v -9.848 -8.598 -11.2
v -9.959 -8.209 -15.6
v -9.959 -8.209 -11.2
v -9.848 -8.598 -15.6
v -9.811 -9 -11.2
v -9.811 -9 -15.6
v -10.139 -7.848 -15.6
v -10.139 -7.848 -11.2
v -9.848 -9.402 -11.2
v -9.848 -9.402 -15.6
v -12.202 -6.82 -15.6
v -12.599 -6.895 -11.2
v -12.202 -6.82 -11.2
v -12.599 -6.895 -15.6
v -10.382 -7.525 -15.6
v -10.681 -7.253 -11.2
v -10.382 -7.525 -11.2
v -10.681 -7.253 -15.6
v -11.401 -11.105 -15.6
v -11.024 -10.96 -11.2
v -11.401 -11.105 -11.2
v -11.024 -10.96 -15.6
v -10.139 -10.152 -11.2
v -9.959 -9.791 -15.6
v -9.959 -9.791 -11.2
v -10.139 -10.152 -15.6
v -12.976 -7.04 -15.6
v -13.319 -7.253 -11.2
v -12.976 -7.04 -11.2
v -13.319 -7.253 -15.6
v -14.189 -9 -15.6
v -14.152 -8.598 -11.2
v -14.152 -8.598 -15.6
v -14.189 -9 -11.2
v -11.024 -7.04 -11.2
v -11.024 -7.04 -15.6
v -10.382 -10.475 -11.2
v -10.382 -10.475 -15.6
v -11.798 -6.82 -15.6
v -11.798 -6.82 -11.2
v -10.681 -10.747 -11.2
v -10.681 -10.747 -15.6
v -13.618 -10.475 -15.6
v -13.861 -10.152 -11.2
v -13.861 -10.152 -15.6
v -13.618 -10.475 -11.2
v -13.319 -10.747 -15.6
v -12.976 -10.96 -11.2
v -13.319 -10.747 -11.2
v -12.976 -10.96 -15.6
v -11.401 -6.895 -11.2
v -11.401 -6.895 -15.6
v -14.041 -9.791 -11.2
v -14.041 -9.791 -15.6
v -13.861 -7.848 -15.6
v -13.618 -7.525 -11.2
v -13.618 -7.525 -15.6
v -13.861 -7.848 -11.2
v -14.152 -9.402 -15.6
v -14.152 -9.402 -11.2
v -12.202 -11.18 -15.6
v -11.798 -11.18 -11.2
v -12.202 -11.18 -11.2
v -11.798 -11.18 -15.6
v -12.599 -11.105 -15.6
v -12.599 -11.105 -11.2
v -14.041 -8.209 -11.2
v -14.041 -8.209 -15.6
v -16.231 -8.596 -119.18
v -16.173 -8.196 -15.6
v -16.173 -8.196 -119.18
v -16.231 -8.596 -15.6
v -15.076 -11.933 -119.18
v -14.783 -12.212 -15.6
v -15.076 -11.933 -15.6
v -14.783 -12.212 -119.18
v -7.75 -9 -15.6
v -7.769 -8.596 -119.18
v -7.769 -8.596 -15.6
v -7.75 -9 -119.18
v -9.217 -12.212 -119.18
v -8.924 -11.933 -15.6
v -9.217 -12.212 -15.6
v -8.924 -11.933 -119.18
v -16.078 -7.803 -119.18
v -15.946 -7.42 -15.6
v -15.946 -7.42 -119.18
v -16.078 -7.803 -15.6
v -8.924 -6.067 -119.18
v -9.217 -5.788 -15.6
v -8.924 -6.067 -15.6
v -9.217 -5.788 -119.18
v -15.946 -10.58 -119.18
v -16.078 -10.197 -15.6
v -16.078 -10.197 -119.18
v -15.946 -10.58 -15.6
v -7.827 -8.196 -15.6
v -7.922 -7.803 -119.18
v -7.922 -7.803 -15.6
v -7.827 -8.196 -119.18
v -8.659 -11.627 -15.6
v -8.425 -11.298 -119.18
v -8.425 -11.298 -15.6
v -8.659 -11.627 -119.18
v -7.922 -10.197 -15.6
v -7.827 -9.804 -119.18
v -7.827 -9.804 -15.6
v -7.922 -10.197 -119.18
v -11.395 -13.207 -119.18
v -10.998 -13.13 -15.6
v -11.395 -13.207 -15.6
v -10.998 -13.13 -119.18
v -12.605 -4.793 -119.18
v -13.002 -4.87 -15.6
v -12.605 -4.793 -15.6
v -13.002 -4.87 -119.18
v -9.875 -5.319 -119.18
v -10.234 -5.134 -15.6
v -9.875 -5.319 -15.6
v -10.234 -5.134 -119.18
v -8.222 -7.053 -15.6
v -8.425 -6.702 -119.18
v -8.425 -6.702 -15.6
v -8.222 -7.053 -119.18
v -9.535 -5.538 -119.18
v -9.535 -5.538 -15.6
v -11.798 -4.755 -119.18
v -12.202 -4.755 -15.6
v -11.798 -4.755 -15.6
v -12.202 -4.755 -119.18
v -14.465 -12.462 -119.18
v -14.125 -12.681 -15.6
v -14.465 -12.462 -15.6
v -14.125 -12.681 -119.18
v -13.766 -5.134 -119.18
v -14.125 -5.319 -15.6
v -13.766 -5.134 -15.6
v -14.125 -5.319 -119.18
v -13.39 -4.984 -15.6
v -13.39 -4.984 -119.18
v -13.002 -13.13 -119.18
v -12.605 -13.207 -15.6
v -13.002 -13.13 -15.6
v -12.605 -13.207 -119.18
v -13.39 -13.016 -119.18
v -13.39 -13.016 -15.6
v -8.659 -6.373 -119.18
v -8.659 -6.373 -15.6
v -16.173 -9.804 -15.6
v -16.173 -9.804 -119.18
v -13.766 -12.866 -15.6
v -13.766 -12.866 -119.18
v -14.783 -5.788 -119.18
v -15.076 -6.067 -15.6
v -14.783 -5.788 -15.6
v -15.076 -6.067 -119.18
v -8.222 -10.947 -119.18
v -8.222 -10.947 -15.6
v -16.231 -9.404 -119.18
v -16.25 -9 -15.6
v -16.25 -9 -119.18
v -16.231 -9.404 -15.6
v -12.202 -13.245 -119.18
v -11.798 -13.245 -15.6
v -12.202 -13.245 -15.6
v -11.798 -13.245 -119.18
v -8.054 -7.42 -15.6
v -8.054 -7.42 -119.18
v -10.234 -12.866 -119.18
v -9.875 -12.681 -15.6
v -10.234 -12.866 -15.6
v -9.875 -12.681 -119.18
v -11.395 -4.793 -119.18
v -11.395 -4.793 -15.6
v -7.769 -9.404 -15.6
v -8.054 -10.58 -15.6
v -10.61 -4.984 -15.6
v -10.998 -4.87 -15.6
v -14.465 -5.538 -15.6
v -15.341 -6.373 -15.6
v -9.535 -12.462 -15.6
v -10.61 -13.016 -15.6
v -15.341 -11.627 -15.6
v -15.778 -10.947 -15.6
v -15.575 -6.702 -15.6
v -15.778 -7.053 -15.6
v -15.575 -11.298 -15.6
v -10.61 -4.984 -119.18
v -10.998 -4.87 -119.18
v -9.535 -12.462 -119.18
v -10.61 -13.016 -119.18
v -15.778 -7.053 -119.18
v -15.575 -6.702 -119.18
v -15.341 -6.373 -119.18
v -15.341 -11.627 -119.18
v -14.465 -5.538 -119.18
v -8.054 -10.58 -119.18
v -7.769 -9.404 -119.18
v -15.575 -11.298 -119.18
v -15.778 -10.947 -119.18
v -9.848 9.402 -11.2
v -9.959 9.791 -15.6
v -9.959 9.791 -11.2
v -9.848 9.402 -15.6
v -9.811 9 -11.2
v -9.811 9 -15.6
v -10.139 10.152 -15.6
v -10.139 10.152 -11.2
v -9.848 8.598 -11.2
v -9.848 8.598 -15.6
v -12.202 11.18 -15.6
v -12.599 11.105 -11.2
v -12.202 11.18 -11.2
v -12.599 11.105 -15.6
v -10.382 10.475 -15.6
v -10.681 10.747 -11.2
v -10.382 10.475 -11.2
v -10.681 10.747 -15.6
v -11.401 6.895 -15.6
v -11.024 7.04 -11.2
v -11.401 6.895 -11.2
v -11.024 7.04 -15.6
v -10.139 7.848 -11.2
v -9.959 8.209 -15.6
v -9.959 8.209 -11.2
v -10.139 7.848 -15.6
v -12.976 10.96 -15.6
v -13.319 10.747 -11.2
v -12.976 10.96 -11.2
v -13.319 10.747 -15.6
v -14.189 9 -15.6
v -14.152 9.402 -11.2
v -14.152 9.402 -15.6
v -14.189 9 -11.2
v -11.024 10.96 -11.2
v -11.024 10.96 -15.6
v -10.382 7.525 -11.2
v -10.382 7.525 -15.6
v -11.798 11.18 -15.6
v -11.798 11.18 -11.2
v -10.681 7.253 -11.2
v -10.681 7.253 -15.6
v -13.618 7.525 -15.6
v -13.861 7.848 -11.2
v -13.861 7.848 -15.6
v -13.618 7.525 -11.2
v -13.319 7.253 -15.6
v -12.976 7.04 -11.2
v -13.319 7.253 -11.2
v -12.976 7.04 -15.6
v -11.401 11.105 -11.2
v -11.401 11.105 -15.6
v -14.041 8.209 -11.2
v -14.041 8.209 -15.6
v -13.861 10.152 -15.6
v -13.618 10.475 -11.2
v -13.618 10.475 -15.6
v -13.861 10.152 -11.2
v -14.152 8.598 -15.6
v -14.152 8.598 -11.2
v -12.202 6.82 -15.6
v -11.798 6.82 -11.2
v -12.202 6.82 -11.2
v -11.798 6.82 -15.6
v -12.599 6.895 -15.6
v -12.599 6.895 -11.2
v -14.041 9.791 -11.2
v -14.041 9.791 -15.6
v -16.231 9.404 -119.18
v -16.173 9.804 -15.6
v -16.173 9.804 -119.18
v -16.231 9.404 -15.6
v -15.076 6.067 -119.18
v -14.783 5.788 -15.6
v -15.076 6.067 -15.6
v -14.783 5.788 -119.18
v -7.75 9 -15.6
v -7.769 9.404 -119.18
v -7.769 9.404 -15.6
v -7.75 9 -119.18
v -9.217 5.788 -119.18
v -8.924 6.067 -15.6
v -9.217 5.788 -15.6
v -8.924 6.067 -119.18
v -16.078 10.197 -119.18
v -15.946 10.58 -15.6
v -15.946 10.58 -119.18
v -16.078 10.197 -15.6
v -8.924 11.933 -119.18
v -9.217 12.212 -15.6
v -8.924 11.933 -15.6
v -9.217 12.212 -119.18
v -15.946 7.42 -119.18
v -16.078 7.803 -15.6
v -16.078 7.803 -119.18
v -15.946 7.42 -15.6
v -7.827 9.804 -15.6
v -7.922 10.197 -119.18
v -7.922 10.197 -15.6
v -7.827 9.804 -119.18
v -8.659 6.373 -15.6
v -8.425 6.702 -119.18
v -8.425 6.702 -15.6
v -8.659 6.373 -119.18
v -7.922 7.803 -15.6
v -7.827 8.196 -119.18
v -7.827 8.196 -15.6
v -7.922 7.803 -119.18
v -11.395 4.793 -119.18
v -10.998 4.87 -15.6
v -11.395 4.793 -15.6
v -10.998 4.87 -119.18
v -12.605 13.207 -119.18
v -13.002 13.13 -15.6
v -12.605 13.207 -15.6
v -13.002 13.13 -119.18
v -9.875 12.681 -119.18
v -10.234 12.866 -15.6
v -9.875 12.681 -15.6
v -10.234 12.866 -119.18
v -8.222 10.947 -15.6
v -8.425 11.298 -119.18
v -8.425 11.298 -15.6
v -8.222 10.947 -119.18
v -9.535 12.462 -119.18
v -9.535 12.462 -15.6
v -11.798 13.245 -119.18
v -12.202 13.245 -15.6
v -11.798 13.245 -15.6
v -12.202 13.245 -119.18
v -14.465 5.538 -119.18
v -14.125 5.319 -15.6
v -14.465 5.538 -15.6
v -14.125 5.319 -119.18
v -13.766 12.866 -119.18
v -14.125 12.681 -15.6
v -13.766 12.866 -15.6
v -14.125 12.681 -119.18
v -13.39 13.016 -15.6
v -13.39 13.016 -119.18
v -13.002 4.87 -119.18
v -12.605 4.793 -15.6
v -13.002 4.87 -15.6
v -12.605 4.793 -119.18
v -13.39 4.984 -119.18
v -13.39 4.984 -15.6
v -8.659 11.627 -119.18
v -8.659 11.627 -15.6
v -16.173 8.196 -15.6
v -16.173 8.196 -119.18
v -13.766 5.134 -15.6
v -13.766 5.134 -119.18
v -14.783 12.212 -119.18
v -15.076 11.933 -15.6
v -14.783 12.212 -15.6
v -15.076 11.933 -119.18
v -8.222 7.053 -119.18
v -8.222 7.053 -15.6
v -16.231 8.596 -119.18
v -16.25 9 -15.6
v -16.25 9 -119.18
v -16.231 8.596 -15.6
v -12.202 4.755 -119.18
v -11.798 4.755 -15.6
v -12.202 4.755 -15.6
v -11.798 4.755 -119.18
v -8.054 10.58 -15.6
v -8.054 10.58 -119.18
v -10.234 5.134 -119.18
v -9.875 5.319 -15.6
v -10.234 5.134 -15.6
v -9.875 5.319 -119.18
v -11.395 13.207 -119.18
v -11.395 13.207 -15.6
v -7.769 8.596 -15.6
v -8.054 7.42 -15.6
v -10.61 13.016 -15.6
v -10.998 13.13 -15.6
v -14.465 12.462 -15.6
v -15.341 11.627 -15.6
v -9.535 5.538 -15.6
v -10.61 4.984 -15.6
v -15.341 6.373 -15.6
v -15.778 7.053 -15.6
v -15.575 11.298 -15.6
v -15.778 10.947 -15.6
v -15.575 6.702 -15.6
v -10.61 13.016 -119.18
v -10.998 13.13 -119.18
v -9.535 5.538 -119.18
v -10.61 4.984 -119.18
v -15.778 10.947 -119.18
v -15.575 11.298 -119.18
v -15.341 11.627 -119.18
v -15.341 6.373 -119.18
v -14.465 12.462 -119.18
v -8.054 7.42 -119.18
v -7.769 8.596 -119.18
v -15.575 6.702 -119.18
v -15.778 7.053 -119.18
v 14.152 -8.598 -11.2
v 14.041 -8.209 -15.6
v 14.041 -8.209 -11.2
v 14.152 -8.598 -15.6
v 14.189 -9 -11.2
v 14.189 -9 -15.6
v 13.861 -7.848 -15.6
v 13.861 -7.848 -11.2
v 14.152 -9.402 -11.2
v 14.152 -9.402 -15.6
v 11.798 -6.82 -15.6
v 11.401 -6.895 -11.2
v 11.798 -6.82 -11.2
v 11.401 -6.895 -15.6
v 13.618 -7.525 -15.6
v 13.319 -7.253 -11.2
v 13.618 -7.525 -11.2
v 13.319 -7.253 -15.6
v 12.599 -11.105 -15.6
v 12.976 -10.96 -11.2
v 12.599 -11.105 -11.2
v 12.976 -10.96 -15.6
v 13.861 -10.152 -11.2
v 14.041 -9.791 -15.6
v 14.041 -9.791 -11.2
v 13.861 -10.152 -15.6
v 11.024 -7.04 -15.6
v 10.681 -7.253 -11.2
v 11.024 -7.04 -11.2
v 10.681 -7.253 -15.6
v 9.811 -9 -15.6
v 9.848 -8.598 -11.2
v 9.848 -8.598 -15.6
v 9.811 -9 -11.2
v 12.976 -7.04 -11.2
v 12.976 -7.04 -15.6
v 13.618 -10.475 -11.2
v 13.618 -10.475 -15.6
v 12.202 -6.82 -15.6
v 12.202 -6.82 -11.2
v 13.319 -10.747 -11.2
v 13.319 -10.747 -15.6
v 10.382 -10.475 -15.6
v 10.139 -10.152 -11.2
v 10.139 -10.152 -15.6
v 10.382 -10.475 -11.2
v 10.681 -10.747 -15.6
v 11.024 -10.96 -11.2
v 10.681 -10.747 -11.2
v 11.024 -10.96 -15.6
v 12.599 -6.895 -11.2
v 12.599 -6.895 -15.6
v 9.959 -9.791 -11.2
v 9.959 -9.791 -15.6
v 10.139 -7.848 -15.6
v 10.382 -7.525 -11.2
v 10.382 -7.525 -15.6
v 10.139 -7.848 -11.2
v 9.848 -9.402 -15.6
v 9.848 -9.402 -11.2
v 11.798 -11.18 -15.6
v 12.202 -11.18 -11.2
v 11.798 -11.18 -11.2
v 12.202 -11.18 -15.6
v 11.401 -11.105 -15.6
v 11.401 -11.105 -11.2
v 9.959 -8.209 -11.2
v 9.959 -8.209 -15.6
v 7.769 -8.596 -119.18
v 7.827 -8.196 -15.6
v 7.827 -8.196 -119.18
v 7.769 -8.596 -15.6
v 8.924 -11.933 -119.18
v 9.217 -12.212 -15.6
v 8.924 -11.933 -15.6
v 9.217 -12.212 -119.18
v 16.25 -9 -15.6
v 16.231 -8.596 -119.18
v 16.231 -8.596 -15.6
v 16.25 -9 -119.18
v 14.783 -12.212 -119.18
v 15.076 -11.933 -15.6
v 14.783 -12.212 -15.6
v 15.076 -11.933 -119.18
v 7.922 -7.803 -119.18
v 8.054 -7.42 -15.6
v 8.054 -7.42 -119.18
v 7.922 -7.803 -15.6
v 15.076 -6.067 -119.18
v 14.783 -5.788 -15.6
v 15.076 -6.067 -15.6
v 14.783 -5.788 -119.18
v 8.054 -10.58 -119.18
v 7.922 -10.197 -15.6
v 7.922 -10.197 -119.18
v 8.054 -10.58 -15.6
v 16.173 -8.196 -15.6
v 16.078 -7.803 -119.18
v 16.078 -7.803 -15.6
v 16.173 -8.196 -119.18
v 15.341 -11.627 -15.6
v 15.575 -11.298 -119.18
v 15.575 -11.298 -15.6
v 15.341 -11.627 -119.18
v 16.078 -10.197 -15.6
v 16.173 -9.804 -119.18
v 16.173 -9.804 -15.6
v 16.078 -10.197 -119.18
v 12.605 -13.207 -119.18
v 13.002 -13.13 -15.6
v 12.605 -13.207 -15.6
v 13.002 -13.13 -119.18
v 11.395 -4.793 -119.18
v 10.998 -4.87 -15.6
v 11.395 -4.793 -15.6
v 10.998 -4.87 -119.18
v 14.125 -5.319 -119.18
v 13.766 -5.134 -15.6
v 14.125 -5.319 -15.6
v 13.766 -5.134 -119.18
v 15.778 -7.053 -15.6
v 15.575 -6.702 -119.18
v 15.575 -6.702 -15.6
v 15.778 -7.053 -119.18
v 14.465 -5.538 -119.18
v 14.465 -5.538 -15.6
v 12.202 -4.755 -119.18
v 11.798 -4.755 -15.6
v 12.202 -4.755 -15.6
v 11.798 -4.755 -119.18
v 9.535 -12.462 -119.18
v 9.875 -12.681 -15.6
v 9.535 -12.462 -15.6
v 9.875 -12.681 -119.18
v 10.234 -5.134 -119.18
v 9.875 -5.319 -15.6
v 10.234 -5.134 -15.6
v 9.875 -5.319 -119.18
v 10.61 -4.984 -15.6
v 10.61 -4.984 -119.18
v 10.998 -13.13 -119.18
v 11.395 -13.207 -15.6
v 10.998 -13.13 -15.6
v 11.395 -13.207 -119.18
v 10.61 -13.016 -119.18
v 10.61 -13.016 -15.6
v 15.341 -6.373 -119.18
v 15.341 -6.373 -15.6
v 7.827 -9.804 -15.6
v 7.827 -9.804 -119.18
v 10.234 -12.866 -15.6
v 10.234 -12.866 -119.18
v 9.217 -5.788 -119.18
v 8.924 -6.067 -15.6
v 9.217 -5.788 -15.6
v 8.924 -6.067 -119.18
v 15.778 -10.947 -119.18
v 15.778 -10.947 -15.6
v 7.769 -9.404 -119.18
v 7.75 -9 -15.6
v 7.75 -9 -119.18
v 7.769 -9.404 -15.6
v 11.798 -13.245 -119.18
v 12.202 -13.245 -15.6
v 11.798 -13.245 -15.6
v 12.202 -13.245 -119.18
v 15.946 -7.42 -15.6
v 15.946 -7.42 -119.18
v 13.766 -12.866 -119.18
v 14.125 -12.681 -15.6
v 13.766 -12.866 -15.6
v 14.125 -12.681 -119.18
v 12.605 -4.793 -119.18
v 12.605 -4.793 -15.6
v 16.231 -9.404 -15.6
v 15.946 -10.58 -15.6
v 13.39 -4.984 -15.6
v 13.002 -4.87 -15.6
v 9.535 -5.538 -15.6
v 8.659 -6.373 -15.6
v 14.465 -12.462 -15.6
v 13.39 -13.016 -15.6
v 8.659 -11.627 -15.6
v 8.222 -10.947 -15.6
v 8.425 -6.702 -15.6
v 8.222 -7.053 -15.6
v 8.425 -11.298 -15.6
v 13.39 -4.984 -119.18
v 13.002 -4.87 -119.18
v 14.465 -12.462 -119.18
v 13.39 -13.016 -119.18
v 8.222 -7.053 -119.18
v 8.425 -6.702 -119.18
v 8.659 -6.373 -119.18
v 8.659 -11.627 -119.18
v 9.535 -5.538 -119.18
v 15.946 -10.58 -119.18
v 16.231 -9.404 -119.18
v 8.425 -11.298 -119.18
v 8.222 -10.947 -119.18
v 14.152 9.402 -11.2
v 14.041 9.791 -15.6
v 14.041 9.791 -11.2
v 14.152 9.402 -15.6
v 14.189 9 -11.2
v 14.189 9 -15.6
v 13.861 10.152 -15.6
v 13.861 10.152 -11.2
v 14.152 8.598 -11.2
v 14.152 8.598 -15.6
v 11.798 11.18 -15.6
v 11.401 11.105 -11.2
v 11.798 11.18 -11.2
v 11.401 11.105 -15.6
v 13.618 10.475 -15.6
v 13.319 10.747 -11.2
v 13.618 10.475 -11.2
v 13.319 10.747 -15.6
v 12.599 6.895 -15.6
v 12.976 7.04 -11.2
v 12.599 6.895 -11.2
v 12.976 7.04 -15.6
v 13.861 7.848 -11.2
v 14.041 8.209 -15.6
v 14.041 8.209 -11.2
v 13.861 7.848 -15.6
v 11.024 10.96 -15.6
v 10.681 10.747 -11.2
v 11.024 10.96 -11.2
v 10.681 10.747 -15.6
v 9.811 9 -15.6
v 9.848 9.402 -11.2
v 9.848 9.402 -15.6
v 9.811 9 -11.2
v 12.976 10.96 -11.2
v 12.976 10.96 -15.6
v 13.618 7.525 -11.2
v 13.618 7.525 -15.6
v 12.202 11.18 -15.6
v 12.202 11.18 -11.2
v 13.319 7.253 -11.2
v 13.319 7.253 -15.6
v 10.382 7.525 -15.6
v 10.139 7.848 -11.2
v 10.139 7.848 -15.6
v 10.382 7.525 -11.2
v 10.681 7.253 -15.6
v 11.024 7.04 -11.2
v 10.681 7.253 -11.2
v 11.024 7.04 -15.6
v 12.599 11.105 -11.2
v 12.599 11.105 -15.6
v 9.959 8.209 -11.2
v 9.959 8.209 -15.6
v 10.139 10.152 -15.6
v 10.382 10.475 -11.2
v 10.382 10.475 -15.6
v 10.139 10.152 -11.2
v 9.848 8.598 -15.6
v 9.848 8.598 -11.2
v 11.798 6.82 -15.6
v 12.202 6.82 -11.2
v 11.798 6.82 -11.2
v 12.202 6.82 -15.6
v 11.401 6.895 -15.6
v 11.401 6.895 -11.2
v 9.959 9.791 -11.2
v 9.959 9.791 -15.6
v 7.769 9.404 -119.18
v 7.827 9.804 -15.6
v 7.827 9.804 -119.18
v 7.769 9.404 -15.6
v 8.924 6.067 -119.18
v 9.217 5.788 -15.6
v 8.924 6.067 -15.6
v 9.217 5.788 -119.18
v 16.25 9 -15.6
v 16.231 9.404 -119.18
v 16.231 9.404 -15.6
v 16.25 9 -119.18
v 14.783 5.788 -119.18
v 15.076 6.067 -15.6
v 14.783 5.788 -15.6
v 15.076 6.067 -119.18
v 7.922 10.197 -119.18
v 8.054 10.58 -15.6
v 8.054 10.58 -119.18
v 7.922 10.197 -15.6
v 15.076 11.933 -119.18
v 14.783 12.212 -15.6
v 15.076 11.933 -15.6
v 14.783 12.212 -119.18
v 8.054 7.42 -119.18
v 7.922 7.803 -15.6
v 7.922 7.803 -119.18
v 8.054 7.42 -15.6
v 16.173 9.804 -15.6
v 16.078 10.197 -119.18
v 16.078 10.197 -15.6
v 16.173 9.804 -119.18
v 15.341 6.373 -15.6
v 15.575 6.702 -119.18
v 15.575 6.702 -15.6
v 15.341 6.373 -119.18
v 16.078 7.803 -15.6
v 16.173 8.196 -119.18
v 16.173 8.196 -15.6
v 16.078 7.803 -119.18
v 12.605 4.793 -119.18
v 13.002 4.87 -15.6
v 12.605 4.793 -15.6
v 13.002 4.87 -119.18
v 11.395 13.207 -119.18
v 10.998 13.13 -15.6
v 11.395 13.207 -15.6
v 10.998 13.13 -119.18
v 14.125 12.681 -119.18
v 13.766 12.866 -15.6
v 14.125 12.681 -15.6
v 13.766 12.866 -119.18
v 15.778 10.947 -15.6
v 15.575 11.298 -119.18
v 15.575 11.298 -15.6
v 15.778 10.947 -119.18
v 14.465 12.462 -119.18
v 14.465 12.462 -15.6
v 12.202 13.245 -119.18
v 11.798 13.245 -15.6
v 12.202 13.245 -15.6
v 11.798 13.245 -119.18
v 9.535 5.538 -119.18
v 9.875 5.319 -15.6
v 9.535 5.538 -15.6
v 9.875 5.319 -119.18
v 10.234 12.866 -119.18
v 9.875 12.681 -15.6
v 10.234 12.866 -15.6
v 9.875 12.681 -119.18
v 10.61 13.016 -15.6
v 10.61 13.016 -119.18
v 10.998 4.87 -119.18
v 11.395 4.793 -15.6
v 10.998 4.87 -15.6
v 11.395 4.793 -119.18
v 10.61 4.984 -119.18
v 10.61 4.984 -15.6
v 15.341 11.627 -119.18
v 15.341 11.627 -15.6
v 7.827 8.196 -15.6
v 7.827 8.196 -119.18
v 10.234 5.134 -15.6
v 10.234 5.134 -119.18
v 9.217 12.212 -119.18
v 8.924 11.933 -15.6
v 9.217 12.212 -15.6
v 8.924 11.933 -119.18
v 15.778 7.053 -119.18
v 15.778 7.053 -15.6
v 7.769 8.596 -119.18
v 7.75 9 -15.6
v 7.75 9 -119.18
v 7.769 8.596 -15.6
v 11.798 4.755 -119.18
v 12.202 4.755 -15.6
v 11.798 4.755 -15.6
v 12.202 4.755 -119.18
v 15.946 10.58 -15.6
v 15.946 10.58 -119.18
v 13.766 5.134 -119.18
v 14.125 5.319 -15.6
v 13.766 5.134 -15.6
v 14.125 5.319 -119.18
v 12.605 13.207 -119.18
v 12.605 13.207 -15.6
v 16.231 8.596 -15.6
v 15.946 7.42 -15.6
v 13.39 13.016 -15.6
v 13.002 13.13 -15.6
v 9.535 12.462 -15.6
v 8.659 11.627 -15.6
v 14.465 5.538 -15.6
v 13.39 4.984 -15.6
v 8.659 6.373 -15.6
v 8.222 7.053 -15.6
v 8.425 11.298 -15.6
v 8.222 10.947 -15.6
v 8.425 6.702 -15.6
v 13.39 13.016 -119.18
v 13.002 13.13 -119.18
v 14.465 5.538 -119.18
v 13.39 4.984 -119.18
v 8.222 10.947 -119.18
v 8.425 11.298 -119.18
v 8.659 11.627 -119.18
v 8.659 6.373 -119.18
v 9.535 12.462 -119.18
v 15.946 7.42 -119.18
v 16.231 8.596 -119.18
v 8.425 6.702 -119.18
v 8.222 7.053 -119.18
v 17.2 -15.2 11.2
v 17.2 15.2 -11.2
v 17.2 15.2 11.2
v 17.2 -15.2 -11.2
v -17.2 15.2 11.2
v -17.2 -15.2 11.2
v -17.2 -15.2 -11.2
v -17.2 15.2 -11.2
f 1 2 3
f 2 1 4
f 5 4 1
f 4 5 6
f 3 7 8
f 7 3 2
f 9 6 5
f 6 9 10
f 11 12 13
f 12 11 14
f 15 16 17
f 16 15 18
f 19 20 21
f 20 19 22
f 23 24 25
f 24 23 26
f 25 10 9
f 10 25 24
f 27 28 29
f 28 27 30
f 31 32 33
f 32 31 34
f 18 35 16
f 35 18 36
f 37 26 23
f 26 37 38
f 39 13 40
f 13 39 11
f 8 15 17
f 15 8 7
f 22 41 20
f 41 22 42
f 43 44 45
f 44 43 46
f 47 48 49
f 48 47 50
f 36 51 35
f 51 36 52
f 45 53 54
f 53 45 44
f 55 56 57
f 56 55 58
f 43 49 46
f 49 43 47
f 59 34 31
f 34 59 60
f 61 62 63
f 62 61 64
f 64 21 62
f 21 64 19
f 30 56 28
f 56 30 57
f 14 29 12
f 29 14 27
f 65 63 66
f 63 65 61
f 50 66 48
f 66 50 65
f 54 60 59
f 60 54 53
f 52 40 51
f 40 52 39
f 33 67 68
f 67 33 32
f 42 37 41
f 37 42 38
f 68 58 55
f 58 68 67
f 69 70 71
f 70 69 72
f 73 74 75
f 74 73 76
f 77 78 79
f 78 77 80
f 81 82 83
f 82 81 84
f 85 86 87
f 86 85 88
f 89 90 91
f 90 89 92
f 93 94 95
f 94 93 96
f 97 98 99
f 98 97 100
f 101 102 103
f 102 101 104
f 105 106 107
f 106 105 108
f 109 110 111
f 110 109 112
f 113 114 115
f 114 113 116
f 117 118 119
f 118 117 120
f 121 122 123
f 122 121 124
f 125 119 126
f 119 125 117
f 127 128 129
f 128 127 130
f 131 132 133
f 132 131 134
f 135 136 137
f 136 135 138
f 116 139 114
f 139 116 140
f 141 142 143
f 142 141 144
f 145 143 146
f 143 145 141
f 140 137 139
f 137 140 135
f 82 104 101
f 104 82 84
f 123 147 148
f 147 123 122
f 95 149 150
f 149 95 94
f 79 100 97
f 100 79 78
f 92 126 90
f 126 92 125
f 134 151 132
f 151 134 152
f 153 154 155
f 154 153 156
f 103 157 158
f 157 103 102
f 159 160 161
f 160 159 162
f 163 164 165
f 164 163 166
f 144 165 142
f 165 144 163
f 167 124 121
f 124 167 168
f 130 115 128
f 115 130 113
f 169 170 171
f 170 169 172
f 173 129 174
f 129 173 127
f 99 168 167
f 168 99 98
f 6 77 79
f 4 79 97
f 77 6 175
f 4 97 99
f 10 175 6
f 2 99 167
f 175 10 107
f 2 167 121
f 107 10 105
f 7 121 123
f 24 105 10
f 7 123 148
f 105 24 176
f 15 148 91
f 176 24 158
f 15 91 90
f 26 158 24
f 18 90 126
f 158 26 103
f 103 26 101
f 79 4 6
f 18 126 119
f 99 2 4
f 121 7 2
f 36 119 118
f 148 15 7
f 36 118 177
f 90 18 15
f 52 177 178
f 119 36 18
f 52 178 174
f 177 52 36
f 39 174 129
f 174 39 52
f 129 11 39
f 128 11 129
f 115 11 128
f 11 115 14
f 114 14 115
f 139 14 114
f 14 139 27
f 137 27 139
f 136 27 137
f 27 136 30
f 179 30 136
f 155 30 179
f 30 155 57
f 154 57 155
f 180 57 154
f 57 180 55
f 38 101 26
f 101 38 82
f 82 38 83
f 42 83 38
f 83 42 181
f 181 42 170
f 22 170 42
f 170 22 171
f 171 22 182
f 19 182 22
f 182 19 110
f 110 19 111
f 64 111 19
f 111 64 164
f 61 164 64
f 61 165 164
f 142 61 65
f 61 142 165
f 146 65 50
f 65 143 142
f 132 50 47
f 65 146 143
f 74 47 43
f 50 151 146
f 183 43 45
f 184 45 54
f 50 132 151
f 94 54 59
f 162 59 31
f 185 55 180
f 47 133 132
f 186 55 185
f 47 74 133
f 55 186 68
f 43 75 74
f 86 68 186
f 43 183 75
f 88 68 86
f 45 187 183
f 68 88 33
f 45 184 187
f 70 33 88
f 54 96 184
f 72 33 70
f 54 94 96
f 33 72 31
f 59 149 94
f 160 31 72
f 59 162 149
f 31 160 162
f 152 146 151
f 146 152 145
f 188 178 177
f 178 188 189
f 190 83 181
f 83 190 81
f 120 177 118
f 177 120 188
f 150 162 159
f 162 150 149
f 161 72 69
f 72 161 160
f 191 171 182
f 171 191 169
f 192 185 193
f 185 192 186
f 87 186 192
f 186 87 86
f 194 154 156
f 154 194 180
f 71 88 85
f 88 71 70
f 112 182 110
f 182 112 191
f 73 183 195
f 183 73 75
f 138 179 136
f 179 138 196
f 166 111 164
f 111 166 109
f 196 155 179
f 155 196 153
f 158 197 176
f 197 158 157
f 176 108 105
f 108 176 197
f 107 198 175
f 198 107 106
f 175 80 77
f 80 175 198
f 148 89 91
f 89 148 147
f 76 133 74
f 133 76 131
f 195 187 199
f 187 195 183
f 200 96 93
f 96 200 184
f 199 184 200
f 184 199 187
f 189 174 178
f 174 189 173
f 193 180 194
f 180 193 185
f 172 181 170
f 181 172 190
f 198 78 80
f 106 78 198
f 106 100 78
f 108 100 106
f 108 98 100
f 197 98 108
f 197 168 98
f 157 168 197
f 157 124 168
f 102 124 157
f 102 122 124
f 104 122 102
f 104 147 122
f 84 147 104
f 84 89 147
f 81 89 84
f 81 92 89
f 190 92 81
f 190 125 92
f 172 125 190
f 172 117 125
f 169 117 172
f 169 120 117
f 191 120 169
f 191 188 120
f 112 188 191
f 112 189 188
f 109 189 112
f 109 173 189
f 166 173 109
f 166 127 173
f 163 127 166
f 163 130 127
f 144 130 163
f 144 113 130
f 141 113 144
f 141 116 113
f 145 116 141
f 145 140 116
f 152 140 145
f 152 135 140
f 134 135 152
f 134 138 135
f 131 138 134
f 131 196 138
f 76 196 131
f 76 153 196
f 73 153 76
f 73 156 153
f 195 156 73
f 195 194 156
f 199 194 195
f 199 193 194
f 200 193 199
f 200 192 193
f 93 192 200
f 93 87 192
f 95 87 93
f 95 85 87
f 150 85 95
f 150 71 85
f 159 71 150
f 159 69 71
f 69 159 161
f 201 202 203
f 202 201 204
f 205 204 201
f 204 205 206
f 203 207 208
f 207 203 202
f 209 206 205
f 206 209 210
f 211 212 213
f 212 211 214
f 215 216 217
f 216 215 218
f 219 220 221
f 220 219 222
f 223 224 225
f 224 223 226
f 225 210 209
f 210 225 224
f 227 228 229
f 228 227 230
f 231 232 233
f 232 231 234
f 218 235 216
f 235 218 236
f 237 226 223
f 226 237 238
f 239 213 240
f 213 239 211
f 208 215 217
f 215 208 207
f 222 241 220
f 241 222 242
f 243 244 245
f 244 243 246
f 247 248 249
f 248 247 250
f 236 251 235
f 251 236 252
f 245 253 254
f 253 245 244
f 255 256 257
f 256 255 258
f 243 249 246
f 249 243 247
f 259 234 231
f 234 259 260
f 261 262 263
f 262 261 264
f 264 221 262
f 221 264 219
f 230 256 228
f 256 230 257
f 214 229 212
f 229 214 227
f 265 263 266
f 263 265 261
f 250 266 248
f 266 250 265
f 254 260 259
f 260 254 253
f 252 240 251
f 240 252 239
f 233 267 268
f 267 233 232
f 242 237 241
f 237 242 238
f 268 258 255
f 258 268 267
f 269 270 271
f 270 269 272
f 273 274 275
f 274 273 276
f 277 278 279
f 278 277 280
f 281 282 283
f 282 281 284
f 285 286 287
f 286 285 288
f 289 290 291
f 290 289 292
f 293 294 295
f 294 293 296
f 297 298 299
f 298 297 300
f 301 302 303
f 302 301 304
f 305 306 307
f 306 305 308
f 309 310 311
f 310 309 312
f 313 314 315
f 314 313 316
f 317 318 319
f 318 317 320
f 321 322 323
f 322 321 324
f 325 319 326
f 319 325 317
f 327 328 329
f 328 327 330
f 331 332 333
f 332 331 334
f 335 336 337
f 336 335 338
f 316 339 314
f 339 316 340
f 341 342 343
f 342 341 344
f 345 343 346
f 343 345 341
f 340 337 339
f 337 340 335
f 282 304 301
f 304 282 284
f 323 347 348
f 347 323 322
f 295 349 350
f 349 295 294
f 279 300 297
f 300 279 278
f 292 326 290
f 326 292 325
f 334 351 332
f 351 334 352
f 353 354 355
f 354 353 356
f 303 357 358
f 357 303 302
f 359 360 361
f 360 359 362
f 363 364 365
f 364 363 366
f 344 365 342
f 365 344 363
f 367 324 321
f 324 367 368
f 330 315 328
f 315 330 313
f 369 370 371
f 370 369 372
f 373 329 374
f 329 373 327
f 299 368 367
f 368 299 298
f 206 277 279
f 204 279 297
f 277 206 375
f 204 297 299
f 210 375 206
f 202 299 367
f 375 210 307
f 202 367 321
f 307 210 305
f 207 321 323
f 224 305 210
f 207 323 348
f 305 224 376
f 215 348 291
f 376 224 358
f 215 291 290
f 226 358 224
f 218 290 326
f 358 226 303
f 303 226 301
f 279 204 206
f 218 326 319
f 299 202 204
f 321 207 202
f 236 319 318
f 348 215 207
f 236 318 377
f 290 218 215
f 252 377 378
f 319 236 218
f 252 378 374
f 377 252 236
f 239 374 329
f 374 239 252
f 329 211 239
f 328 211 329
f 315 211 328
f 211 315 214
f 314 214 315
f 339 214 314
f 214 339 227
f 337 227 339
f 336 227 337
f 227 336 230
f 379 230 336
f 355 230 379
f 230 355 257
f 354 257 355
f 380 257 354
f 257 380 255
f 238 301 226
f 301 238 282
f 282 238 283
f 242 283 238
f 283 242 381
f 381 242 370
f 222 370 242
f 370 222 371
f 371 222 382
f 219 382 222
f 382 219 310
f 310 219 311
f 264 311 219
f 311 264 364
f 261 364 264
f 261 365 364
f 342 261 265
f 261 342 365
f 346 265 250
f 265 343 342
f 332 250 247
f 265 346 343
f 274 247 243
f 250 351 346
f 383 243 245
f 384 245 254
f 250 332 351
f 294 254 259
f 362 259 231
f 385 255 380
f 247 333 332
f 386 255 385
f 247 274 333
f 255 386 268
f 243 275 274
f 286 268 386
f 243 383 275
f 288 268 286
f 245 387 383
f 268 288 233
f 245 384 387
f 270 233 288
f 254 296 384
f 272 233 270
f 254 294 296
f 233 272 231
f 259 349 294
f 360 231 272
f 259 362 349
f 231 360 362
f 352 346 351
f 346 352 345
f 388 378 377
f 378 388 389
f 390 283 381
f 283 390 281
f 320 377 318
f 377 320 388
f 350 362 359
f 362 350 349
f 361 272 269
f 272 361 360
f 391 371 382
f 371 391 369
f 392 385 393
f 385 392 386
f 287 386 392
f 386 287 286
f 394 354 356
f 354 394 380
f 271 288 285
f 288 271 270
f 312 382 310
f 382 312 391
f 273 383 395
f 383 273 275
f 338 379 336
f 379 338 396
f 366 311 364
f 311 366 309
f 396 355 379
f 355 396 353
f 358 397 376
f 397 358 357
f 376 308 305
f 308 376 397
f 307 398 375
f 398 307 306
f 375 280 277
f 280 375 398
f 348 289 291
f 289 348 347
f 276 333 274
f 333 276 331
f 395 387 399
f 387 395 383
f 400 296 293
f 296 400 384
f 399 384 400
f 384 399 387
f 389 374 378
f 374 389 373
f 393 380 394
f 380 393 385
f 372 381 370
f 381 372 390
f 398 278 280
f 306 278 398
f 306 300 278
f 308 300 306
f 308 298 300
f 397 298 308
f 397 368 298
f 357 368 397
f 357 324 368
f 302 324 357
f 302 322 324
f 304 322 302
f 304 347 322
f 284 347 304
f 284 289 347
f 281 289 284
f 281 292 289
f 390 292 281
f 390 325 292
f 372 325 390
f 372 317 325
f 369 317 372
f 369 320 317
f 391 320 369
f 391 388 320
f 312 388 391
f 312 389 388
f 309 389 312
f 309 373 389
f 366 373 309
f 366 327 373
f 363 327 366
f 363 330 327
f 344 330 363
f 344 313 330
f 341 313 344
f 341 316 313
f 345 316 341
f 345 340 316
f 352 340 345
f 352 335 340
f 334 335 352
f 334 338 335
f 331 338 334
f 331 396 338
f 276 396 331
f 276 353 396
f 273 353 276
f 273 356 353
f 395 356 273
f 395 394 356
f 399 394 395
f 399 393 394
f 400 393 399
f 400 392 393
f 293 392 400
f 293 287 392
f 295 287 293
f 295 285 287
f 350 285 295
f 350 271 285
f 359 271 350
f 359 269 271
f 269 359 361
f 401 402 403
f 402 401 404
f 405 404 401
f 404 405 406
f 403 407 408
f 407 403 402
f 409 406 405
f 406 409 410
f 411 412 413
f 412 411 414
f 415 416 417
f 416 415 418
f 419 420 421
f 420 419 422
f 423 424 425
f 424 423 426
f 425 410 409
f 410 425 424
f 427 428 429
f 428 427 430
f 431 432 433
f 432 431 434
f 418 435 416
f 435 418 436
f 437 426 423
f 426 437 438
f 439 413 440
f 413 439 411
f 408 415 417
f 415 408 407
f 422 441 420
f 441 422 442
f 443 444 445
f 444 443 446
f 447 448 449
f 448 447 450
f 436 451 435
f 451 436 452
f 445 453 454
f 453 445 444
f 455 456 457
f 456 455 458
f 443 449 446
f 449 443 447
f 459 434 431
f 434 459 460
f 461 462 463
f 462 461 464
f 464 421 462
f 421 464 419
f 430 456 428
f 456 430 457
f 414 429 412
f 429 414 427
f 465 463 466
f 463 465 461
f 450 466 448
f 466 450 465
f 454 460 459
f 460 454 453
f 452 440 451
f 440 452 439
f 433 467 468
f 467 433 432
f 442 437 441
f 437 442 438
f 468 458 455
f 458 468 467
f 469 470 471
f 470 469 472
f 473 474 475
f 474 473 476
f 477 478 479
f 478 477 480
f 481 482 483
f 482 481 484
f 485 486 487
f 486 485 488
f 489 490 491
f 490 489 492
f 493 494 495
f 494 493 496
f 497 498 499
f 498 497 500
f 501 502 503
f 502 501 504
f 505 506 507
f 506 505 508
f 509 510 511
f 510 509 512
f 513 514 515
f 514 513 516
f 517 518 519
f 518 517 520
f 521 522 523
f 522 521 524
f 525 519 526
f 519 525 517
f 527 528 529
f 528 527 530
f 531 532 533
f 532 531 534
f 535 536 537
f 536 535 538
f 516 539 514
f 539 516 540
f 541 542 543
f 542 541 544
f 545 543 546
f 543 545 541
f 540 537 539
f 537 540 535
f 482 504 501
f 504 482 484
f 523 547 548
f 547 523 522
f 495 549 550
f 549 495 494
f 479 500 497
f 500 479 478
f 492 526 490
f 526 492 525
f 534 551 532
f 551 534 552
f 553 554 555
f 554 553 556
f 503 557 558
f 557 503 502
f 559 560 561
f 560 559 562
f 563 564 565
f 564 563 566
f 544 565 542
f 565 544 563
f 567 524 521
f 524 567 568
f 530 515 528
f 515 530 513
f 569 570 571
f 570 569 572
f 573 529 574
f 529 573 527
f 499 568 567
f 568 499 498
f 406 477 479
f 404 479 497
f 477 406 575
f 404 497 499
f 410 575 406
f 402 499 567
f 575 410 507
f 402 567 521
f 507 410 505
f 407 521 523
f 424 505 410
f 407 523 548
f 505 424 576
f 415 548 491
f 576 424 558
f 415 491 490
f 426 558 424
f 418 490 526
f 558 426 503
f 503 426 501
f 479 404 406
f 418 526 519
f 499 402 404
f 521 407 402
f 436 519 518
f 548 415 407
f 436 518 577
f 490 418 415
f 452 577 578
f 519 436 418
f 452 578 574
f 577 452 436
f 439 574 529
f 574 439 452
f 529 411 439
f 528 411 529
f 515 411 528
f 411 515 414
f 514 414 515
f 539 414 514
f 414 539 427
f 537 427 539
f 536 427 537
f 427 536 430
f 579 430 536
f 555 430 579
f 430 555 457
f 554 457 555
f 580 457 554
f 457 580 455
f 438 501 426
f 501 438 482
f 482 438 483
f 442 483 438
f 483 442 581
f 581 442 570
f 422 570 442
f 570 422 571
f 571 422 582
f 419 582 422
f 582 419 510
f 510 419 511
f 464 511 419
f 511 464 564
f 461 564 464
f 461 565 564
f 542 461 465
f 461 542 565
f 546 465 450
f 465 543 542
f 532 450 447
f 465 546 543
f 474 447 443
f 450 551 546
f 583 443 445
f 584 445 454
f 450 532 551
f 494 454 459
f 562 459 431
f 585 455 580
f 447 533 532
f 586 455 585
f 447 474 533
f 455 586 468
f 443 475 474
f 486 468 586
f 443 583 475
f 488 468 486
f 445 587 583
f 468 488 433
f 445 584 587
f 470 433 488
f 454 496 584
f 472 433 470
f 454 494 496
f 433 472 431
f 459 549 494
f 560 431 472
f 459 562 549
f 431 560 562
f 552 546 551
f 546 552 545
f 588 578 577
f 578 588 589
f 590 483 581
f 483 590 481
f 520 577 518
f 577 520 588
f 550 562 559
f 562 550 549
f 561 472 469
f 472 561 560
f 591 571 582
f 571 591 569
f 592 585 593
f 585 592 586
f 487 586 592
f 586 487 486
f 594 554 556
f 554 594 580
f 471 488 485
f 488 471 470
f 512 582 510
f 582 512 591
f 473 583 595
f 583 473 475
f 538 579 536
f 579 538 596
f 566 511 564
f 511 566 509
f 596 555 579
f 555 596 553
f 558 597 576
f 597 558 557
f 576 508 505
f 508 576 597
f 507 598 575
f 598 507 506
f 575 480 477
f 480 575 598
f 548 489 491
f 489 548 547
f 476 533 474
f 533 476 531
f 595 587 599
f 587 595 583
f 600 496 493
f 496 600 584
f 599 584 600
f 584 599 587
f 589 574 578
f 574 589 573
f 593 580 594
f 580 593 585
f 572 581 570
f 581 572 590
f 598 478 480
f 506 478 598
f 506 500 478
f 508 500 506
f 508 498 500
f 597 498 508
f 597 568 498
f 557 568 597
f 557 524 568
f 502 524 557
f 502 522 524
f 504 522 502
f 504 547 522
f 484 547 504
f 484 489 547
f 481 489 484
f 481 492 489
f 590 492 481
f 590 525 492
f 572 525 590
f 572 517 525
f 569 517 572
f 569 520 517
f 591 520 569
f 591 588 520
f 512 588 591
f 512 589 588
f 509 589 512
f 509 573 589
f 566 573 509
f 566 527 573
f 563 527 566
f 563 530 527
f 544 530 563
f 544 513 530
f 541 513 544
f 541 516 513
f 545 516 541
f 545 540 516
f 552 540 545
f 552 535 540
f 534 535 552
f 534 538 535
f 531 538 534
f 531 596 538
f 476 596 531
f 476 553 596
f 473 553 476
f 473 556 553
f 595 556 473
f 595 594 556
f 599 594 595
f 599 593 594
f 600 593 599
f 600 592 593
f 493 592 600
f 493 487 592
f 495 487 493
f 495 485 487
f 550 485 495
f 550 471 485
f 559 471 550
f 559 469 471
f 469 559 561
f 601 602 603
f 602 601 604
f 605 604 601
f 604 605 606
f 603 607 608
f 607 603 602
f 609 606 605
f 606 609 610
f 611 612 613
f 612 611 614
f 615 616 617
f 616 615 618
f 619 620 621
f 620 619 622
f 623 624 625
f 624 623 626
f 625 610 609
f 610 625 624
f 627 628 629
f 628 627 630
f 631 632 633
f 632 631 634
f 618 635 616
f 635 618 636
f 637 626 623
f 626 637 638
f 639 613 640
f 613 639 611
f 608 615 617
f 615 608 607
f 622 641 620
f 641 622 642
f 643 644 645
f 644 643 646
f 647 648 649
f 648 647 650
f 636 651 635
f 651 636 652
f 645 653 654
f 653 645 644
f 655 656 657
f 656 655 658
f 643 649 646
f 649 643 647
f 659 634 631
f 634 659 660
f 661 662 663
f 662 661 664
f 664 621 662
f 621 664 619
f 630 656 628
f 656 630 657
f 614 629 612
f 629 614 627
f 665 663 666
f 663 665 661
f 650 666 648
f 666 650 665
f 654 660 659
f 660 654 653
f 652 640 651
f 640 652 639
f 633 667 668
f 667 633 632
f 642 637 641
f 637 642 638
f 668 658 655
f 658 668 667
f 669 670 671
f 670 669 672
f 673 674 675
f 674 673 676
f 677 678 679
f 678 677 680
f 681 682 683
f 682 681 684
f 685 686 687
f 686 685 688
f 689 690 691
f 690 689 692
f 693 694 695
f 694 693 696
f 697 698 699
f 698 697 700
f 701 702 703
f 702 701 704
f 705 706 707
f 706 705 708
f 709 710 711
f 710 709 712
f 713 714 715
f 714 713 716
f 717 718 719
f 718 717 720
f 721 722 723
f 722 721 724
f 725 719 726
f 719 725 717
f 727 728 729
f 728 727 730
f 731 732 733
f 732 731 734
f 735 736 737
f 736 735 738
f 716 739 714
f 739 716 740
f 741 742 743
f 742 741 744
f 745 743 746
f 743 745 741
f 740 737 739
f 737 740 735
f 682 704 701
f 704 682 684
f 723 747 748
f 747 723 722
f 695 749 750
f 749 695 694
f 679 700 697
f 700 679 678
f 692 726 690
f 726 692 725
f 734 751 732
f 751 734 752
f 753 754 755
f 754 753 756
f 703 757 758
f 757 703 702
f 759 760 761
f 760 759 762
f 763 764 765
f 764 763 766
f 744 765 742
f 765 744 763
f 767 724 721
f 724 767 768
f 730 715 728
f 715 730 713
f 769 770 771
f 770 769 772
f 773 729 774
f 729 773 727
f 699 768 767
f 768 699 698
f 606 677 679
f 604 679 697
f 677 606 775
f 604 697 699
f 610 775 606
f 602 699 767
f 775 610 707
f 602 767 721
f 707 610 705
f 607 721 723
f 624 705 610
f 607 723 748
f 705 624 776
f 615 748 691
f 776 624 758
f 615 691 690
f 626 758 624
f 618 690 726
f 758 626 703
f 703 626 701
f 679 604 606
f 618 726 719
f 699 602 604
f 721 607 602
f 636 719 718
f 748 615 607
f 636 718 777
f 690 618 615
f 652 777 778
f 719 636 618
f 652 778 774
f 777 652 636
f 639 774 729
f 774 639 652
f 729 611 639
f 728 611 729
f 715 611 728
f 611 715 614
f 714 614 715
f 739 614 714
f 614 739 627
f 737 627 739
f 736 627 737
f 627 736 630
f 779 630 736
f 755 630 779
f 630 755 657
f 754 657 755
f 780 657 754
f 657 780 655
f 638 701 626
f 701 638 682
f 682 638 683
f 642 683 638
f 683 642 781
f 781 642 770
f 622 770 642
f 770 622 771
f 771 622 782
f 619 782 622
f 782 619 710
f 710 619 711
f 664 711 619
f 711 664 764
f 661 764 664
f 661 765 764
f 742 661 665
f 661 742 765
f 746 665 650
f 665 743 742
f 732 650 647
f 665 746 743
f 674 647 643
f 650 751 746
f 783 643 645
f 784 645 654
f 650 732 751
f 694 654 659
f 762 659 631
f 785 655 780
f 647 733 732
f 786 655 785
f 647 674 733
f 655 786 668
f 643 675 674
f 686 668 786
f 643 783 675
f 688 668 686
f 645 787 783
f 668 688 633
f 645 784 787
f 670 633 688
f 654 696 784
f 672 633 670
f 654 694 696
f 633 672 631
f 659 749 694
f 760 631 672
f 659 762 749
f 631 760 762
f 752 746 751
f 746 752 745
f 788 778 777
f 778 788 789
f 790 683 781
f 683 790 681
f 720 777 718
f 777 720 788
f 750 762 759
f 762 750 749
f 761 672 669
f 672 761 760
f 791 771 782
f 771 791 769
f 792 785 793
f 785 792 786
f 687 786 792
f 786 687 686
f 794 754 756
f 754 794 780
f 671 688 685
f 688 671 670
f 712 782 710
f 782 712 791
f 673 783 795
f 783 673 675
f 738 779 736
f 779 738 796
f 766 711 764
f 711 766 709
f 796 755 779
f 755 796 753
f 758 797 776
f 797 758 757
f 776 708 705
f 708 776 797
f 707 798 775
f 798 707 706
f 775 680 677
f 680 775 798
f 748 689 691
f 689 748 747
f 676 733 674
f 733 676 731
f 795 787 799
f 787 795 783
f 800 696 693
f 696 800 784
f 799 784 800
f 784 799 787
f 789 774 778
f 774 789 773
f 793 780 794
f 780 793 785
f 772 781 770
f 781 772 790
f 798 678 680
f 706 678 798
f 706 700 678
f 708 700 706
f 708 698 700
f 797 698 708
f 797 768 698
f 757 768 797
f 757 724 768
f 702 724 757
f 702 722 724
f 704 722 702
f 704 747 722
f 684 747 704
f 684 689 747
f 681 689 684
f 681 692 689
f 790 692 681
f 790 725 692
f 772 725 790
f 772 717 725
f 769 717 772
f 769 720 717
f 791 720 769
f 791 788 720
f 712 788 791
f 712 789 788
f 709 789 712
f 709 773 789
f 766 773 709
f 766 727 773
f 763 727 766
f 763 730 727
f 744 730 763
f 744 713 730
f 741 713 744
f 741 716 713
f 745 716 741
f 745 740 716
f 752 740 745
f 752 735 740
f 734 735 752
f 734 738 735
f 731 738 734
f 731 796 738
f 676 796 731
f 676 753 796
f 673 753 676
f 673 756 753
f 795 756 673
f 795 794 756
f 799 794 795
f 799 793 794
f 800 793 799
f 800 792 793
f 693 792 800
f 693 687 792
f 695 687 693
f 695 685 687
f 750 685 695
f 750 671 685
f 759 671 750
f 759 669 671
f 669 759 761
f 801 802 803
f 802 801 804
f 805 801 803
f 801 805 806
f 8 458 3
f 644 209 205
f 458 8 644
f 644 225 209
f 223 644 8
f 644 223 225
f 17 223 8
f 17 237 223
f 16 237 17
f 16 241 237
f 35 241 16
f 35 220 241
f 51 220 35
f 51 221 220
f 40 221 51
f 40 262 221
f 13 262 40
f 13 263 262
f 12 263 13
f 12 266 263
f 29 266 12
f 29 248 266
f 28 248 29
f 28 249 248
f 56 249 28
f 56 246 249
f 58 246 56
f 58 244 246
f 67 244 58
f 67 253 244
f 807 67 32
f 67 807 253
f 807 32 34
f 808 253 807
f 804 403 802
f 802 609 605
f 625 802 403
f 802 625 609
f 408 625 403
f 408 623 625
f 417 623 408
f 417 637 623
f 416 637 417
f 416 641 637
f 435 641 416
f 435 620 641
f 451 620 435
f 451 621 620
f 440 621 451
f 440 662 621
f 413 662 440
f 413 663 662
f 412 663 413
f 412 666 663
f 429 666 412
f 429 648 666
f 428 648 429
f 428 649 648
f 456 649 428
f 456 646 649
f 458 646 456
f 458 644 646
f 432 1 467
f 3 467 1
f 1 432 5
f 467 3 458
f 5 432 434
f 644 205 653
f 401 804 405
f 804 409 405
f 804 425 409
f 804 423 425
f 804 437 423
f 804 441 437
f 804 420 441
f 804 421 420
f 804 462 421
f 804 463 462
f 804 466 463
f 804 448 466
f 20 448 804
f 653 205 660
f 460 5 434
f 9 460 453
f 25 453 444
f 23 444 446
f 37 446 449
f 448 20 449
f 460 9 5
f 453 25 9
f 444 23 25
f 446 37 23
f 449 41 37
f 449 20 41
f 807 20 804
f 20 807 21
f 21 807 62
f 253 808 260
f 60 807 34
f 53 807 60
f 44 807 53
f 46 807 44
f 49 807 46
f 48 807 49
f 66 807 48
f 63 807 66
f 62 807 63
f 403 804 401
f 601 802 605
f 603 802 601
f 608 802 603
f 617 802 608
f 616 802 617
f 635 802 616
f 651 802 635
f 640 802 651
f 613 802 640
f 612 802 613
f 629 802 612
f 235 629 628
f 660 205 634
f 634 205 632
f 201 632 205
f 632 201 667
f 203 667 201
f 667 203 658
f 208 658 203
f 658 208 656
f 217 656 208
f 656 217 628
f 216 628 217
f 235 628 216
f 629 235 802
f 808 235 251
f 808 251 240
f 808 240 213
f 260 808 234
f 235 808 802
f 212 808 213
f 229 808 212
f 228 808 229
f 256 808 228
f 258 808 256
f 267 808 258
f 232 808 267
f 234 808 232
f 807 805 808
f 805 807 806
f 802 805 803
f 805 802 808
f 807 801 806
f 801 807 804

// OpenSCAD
union() {
  // base
  // volume
  #cube(size=[34.4, 30.4, 22.4], center=true);
  // bolts
  union() {
    translate(v=[-12.0, -9.0, -10.62])
    union() {
      // thread
      cylinder(h=10, d=4.378, $fn=34, center=true);
      // head
      translate(v=[0, 0, -6.78])
      cylinder(h=3.6, d=8.5, $fn=66, center=true);
      // head_clearance
      translate(v=[0, 0, -58.56])
      cylinder(h=100, d=8.5, $fn=66, center=true);
    }
    translate(v=[-12.0, 9.0, -10.62])
    union() {
      // thread
      cylinder(h=10, d=4.378, $fn=34, center=true);
      // head
      translate(v=[0, 0, -6.78])
      cylinder(h=3.6, d=8.5, $fn=66, center=true);
      // head_clearance
      translate(v=[0, 0, -58.56])
      cylinder(h=100, d=8.5, $fn=66, center=true);
    }
    translate(v=[12.0, -9.0, -10.62])
    union() {
      // thread
      cylinder(h=10, d=4.378, $fn=34, center=true);
      // head
      translate(v=[0, 0, -6.78])
      cylinder(h=3.6, d=8.5, $fn=66, center=true);
      // head_clearance
      translate(v=[0, 0, -58.56])
      cylinder(h=100, d=8.5, $fn=66, center=true);
    }
    translate(v=[12.0, 9.0, -10.62])
    union() {
      // thread
      cylinder(h=10, d=4.378, $fn=34, center=true);
      // head
      translate(v=[0, 0, -6.78])
      cylinder(h=3.6, d=8.5, $fn=66, center=true);
      // head_clearance
      translate(v=[0, 0, -58.56])
      cylinder(h=100, d=8.5, $fn=66, center=true);
    }
  }
}
